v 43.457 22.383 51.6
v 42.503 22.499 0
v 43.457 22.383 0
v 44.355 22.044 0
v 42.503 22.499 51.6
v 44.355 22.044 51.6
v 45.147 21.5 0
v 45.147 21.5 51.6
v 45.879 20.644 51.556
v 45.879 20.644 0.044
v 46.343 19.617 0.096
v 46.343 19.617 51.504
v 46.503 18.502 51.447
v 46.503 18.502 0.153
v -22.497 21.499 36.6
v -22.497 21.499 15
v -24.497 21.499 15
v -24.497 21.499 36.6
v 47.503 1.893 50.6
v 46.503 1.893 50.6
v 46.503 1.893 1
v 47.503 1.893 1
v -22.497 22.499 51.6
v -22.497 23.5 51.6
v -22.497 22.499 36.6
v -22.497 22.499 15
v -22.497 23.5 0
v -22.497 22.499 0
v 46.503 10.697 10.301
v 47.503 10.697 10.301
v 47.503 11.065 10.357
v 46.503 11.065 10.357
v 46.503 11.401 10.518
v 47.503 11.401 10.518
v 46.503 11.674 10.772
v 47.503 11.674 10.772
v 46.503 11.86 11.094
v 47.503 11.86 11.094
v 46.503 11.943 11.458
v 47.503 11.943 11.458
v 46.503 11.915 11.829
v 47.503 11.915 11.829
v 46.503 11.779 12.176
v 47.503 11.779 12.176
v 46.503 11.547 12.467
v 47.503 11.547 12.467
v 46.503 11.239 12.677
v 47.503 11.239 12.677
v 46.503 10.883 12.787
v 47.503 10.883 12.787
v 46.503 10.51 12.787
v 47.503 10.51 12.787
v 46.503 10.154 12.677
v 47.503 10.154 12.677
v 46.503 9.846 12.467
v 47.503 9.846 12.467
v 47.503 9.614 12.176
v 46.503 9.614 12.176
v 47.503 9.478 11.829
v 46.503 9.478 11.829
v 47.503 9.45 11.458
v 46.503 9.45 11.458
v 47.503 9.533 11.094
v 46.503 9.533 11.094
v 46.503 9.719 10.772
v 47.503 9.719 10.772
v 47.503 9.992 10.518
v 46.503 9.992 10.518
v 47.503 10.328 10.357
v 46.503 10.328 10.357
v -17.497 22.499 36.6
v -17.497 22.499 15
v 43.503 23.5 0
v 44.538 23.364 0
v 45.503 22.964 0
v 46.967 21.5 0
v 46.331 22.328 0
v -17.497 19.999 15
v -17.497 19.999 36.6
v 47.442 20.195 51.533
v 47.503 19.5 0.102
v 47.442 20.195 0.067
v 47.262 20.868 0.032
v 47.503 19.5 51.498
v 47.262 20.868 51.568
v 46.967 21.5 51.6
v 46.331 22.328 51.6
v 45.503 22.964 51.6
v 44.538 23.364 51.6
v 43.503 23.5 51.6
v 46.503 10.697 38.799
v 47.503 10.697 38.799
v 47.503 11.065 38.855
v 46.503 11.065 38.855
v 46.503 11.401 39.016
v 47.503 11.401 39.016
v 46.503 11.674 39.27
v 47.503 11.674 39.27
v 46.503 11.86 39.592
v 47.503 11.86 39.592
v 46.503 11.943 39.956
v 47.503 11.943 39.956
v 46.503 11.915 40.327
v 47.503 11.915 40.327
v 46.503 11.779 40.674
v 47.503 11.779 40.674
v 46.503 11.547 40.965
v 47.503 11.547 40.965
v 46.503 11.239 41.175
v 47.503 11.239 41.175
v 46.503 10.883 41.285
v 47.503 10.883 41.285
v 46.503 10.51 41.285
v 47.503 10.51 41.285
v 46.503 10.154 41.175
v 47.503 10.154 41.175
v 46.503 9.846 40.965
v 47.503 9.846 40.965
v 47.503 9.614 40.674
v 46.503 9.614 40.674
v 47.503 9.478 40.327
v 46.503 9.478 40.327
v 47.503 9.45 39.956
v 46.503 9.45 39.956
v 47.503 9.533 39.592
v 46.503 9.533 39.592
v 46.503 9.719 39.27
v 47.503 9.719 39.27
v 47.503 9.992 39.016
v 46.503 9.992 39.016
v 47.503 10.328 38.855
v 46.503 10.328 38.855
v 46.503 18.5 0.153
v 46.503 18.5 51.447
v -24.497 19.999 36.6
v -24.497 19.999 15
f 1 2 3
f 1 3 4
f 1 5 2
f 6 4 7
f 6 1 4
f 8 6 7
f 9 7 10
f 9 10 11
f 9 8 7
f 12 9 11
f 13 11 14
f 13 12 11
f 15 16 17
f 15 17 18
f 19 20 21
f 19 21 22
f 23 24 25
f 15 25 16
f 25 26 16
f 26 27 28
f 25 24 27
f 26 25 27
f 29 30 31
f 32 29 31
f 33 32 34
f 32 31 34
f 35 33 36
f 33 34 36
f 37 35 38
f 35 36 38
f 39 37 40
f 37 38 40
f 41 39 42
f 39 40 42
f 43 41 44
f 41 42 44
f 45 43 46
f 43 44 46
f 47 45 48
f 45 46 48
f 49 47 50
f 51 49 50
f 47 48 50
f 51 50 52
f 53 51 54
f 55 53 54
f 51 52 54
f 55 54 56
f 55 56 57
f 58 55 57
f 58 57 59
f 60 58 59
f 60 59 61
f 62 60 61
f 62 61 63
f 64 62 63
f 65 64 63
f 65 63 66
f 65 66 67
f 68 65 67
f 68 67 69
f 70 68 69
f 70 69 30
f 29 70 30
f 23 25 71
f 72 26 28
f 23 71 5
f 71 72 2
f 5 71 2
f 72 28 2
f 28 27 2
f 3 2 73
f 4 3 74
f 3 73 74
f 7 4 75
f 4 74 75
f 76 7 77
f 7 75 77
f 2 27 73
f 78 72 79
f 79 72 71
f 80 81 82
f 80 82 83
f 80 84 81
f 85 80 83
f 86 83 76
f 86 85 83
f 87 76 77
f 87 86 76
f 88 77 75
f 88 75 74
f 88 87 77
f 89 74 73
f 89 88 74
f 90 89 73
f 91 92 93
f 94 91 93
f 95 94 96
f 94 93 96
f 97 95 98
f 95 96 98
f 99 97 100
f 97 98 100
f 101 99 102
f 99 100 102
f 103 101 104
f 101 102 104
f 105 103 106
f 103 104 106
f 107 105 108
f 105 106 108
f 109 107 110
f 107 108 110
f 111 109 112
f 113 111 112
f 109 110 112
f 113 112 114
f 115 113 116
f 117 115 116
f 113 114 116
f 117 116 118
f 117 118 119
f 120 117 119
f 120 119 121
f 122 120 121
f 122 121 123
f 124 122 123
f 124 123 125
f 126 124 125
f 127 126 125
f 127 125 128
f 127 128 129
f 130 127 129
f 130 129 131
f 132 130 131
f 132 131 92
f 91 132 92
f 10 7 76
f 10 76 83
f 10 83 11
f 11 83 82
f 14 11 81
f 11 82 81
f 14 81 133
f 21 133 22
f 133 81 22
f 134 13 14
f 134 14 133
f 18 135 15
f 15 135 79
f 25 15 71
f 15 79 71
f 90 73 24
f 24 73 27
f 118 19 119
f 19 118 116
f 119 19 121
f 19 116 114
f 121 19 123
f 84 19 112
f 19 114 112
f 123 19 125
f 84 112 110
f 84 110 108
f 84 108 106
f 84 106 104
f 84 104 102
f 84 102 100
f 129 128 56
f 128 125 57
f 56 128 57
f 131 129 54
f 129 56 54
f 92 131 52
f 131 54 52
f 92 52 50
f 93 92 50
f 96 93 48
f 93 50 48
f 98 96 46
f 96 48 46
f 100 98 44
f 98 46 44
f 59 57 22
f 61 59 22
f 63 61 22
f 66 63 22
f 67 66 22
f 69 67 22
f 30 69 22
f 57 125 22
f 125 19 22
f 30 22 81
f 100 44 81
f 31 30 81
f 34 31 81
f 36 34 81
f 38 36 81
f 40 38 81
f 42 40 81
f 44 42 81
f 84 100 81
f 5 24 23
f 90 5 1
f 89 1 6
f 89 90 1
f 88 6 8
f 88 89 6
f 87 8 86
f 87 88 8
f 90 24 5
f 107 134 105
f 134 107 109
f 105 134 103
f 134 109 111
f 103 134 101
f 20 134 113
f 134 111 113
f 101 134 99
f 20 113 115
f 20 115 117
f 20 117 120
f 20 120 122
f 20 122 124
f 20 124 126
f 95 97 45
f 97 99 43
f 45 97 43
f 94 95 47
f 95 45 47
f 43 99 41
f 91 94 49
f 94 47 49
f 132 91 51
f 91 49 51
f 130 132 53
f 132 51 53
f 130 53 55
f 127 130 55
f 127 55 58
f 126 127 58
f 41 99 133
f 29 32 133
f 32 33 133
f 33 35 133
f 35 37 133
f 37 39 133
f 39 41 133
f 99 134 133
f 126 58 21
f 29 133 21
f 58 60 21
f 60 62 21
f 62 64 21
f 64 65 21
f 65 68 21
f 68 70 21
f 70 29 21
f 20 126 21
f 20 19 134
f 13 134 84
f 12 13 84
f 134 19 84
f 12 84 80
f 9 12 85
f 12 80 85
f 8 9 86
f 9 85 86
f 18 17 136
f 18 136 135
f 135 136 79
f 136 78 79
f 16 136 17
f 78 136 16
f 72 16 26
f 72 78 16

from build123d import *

# Parameters (mm, degrees)
BOSS_EXTRUDE1_DEPTH = 51.6
CUT_EXTRUDE1_DEPTH  = 10
FILLET3_R           = 4
SKETCH4_W           = 5
SKETCH4_H           = 21.6
BOSS_EXTRUDE2_DEPTH = 2.5
SKETCH5_W           = 21.6
SKETCH5_H           = 1.5
BOSS_EXTRUDE3_DEPTH = 2
SKETCH6_R           = 1.25
CUT_EXTRUDE2_DEPTH  = 2


with BuildPart() as part:
    # Sketch1 → Boss-Extrude1 (new body)
    with BuildSketch(Plane.XY):
        Polygon((-22.497058746, 23.5), (-22.497058746, 22.498632165), (42.604598318, 22.498632165), (46.5, 22.498632165), (46.502941254, 18.5), (46.502941254, 1.893175959), (47.502941254, 1.893175959), (47.502941254, 18.5), (47.502941254, 23.5), (42.5, 23.5), align=None)
    extrude(amount=BOSS_EXTRUDE1_DEPTH)

    # Sketch3 → Cut-Extrude1 (cut)
    with BuildSketch(Plane(origin=(47.502941254, 0, 0), x_dir=(0, 0, -1), z_dir=(1, 0, 0))):
        Polygon((-51.6, 21.5), (-51.6, 1.893175959), (-50.6, 1.893175959), align=None)
        Polygon((0, 21.5), (-1, 1.893175959), (0, 1.893175959), align=None)
    extrude(amount=-CUT_EXTRUDE1_DEPTH, mode=Mode.SUBTRACT)

    # Fillet3
    fillet3_edges = [part.edges().sort_by_distance(p)[0] for p in [
        (46.5, 22.498632165, 25.8),
    ]]
    fillet(fillet3_edges, radius=FILLET3_R)
    fillet3_2_edges = [part.edges().sort_by_distance(p)[0] for p in [
        (47.502941254, 23.5, 25.8),
    ]]
    fillet(fillet3_2_edges, radius=FILLET3_R)

    # Sketch4 → Boss-Extrude2 (add)
    with BuildSketch(Plane.XZ.offset(-22.498632165)):
        with Locations((-19.997058746, 25.8)):
            Rectangle(SKETCH4_W, SKETCH4_H)
    extrude(amount=BOSS_EXTRUDE2_DEPTH)

    # Sketch5 → Boss-Extrude3 (add)
    with BuildSketch(Plane.ZY.offset(22.497058746)):
        with Locations((25.8, 20.748632165)):
            Rectangle(SKETCH5_W, SKETCH5_H)
    extrude(amount=BOSS_EXTRUDE3_DEPTH)

    # Sketch6 → Cut-Extrude2 (cut)
    with BuildSketch(Plane(origin=(47.502941254, 0, 0), x_dir=(0, 0, -1), z_dir=(1, 0, 0))):
        with Locations((-40.048997349, 10.696587979)):
            Circle(SKETCH6_R)
        with Locations((-11.551002651, 10.696587979)):
            Circle(SKETCH6_R)
    extrude(amount=-CUT_EXTRUDE2_DEPTH, mode=Mode.SUBTRACT)


solid = part.part
